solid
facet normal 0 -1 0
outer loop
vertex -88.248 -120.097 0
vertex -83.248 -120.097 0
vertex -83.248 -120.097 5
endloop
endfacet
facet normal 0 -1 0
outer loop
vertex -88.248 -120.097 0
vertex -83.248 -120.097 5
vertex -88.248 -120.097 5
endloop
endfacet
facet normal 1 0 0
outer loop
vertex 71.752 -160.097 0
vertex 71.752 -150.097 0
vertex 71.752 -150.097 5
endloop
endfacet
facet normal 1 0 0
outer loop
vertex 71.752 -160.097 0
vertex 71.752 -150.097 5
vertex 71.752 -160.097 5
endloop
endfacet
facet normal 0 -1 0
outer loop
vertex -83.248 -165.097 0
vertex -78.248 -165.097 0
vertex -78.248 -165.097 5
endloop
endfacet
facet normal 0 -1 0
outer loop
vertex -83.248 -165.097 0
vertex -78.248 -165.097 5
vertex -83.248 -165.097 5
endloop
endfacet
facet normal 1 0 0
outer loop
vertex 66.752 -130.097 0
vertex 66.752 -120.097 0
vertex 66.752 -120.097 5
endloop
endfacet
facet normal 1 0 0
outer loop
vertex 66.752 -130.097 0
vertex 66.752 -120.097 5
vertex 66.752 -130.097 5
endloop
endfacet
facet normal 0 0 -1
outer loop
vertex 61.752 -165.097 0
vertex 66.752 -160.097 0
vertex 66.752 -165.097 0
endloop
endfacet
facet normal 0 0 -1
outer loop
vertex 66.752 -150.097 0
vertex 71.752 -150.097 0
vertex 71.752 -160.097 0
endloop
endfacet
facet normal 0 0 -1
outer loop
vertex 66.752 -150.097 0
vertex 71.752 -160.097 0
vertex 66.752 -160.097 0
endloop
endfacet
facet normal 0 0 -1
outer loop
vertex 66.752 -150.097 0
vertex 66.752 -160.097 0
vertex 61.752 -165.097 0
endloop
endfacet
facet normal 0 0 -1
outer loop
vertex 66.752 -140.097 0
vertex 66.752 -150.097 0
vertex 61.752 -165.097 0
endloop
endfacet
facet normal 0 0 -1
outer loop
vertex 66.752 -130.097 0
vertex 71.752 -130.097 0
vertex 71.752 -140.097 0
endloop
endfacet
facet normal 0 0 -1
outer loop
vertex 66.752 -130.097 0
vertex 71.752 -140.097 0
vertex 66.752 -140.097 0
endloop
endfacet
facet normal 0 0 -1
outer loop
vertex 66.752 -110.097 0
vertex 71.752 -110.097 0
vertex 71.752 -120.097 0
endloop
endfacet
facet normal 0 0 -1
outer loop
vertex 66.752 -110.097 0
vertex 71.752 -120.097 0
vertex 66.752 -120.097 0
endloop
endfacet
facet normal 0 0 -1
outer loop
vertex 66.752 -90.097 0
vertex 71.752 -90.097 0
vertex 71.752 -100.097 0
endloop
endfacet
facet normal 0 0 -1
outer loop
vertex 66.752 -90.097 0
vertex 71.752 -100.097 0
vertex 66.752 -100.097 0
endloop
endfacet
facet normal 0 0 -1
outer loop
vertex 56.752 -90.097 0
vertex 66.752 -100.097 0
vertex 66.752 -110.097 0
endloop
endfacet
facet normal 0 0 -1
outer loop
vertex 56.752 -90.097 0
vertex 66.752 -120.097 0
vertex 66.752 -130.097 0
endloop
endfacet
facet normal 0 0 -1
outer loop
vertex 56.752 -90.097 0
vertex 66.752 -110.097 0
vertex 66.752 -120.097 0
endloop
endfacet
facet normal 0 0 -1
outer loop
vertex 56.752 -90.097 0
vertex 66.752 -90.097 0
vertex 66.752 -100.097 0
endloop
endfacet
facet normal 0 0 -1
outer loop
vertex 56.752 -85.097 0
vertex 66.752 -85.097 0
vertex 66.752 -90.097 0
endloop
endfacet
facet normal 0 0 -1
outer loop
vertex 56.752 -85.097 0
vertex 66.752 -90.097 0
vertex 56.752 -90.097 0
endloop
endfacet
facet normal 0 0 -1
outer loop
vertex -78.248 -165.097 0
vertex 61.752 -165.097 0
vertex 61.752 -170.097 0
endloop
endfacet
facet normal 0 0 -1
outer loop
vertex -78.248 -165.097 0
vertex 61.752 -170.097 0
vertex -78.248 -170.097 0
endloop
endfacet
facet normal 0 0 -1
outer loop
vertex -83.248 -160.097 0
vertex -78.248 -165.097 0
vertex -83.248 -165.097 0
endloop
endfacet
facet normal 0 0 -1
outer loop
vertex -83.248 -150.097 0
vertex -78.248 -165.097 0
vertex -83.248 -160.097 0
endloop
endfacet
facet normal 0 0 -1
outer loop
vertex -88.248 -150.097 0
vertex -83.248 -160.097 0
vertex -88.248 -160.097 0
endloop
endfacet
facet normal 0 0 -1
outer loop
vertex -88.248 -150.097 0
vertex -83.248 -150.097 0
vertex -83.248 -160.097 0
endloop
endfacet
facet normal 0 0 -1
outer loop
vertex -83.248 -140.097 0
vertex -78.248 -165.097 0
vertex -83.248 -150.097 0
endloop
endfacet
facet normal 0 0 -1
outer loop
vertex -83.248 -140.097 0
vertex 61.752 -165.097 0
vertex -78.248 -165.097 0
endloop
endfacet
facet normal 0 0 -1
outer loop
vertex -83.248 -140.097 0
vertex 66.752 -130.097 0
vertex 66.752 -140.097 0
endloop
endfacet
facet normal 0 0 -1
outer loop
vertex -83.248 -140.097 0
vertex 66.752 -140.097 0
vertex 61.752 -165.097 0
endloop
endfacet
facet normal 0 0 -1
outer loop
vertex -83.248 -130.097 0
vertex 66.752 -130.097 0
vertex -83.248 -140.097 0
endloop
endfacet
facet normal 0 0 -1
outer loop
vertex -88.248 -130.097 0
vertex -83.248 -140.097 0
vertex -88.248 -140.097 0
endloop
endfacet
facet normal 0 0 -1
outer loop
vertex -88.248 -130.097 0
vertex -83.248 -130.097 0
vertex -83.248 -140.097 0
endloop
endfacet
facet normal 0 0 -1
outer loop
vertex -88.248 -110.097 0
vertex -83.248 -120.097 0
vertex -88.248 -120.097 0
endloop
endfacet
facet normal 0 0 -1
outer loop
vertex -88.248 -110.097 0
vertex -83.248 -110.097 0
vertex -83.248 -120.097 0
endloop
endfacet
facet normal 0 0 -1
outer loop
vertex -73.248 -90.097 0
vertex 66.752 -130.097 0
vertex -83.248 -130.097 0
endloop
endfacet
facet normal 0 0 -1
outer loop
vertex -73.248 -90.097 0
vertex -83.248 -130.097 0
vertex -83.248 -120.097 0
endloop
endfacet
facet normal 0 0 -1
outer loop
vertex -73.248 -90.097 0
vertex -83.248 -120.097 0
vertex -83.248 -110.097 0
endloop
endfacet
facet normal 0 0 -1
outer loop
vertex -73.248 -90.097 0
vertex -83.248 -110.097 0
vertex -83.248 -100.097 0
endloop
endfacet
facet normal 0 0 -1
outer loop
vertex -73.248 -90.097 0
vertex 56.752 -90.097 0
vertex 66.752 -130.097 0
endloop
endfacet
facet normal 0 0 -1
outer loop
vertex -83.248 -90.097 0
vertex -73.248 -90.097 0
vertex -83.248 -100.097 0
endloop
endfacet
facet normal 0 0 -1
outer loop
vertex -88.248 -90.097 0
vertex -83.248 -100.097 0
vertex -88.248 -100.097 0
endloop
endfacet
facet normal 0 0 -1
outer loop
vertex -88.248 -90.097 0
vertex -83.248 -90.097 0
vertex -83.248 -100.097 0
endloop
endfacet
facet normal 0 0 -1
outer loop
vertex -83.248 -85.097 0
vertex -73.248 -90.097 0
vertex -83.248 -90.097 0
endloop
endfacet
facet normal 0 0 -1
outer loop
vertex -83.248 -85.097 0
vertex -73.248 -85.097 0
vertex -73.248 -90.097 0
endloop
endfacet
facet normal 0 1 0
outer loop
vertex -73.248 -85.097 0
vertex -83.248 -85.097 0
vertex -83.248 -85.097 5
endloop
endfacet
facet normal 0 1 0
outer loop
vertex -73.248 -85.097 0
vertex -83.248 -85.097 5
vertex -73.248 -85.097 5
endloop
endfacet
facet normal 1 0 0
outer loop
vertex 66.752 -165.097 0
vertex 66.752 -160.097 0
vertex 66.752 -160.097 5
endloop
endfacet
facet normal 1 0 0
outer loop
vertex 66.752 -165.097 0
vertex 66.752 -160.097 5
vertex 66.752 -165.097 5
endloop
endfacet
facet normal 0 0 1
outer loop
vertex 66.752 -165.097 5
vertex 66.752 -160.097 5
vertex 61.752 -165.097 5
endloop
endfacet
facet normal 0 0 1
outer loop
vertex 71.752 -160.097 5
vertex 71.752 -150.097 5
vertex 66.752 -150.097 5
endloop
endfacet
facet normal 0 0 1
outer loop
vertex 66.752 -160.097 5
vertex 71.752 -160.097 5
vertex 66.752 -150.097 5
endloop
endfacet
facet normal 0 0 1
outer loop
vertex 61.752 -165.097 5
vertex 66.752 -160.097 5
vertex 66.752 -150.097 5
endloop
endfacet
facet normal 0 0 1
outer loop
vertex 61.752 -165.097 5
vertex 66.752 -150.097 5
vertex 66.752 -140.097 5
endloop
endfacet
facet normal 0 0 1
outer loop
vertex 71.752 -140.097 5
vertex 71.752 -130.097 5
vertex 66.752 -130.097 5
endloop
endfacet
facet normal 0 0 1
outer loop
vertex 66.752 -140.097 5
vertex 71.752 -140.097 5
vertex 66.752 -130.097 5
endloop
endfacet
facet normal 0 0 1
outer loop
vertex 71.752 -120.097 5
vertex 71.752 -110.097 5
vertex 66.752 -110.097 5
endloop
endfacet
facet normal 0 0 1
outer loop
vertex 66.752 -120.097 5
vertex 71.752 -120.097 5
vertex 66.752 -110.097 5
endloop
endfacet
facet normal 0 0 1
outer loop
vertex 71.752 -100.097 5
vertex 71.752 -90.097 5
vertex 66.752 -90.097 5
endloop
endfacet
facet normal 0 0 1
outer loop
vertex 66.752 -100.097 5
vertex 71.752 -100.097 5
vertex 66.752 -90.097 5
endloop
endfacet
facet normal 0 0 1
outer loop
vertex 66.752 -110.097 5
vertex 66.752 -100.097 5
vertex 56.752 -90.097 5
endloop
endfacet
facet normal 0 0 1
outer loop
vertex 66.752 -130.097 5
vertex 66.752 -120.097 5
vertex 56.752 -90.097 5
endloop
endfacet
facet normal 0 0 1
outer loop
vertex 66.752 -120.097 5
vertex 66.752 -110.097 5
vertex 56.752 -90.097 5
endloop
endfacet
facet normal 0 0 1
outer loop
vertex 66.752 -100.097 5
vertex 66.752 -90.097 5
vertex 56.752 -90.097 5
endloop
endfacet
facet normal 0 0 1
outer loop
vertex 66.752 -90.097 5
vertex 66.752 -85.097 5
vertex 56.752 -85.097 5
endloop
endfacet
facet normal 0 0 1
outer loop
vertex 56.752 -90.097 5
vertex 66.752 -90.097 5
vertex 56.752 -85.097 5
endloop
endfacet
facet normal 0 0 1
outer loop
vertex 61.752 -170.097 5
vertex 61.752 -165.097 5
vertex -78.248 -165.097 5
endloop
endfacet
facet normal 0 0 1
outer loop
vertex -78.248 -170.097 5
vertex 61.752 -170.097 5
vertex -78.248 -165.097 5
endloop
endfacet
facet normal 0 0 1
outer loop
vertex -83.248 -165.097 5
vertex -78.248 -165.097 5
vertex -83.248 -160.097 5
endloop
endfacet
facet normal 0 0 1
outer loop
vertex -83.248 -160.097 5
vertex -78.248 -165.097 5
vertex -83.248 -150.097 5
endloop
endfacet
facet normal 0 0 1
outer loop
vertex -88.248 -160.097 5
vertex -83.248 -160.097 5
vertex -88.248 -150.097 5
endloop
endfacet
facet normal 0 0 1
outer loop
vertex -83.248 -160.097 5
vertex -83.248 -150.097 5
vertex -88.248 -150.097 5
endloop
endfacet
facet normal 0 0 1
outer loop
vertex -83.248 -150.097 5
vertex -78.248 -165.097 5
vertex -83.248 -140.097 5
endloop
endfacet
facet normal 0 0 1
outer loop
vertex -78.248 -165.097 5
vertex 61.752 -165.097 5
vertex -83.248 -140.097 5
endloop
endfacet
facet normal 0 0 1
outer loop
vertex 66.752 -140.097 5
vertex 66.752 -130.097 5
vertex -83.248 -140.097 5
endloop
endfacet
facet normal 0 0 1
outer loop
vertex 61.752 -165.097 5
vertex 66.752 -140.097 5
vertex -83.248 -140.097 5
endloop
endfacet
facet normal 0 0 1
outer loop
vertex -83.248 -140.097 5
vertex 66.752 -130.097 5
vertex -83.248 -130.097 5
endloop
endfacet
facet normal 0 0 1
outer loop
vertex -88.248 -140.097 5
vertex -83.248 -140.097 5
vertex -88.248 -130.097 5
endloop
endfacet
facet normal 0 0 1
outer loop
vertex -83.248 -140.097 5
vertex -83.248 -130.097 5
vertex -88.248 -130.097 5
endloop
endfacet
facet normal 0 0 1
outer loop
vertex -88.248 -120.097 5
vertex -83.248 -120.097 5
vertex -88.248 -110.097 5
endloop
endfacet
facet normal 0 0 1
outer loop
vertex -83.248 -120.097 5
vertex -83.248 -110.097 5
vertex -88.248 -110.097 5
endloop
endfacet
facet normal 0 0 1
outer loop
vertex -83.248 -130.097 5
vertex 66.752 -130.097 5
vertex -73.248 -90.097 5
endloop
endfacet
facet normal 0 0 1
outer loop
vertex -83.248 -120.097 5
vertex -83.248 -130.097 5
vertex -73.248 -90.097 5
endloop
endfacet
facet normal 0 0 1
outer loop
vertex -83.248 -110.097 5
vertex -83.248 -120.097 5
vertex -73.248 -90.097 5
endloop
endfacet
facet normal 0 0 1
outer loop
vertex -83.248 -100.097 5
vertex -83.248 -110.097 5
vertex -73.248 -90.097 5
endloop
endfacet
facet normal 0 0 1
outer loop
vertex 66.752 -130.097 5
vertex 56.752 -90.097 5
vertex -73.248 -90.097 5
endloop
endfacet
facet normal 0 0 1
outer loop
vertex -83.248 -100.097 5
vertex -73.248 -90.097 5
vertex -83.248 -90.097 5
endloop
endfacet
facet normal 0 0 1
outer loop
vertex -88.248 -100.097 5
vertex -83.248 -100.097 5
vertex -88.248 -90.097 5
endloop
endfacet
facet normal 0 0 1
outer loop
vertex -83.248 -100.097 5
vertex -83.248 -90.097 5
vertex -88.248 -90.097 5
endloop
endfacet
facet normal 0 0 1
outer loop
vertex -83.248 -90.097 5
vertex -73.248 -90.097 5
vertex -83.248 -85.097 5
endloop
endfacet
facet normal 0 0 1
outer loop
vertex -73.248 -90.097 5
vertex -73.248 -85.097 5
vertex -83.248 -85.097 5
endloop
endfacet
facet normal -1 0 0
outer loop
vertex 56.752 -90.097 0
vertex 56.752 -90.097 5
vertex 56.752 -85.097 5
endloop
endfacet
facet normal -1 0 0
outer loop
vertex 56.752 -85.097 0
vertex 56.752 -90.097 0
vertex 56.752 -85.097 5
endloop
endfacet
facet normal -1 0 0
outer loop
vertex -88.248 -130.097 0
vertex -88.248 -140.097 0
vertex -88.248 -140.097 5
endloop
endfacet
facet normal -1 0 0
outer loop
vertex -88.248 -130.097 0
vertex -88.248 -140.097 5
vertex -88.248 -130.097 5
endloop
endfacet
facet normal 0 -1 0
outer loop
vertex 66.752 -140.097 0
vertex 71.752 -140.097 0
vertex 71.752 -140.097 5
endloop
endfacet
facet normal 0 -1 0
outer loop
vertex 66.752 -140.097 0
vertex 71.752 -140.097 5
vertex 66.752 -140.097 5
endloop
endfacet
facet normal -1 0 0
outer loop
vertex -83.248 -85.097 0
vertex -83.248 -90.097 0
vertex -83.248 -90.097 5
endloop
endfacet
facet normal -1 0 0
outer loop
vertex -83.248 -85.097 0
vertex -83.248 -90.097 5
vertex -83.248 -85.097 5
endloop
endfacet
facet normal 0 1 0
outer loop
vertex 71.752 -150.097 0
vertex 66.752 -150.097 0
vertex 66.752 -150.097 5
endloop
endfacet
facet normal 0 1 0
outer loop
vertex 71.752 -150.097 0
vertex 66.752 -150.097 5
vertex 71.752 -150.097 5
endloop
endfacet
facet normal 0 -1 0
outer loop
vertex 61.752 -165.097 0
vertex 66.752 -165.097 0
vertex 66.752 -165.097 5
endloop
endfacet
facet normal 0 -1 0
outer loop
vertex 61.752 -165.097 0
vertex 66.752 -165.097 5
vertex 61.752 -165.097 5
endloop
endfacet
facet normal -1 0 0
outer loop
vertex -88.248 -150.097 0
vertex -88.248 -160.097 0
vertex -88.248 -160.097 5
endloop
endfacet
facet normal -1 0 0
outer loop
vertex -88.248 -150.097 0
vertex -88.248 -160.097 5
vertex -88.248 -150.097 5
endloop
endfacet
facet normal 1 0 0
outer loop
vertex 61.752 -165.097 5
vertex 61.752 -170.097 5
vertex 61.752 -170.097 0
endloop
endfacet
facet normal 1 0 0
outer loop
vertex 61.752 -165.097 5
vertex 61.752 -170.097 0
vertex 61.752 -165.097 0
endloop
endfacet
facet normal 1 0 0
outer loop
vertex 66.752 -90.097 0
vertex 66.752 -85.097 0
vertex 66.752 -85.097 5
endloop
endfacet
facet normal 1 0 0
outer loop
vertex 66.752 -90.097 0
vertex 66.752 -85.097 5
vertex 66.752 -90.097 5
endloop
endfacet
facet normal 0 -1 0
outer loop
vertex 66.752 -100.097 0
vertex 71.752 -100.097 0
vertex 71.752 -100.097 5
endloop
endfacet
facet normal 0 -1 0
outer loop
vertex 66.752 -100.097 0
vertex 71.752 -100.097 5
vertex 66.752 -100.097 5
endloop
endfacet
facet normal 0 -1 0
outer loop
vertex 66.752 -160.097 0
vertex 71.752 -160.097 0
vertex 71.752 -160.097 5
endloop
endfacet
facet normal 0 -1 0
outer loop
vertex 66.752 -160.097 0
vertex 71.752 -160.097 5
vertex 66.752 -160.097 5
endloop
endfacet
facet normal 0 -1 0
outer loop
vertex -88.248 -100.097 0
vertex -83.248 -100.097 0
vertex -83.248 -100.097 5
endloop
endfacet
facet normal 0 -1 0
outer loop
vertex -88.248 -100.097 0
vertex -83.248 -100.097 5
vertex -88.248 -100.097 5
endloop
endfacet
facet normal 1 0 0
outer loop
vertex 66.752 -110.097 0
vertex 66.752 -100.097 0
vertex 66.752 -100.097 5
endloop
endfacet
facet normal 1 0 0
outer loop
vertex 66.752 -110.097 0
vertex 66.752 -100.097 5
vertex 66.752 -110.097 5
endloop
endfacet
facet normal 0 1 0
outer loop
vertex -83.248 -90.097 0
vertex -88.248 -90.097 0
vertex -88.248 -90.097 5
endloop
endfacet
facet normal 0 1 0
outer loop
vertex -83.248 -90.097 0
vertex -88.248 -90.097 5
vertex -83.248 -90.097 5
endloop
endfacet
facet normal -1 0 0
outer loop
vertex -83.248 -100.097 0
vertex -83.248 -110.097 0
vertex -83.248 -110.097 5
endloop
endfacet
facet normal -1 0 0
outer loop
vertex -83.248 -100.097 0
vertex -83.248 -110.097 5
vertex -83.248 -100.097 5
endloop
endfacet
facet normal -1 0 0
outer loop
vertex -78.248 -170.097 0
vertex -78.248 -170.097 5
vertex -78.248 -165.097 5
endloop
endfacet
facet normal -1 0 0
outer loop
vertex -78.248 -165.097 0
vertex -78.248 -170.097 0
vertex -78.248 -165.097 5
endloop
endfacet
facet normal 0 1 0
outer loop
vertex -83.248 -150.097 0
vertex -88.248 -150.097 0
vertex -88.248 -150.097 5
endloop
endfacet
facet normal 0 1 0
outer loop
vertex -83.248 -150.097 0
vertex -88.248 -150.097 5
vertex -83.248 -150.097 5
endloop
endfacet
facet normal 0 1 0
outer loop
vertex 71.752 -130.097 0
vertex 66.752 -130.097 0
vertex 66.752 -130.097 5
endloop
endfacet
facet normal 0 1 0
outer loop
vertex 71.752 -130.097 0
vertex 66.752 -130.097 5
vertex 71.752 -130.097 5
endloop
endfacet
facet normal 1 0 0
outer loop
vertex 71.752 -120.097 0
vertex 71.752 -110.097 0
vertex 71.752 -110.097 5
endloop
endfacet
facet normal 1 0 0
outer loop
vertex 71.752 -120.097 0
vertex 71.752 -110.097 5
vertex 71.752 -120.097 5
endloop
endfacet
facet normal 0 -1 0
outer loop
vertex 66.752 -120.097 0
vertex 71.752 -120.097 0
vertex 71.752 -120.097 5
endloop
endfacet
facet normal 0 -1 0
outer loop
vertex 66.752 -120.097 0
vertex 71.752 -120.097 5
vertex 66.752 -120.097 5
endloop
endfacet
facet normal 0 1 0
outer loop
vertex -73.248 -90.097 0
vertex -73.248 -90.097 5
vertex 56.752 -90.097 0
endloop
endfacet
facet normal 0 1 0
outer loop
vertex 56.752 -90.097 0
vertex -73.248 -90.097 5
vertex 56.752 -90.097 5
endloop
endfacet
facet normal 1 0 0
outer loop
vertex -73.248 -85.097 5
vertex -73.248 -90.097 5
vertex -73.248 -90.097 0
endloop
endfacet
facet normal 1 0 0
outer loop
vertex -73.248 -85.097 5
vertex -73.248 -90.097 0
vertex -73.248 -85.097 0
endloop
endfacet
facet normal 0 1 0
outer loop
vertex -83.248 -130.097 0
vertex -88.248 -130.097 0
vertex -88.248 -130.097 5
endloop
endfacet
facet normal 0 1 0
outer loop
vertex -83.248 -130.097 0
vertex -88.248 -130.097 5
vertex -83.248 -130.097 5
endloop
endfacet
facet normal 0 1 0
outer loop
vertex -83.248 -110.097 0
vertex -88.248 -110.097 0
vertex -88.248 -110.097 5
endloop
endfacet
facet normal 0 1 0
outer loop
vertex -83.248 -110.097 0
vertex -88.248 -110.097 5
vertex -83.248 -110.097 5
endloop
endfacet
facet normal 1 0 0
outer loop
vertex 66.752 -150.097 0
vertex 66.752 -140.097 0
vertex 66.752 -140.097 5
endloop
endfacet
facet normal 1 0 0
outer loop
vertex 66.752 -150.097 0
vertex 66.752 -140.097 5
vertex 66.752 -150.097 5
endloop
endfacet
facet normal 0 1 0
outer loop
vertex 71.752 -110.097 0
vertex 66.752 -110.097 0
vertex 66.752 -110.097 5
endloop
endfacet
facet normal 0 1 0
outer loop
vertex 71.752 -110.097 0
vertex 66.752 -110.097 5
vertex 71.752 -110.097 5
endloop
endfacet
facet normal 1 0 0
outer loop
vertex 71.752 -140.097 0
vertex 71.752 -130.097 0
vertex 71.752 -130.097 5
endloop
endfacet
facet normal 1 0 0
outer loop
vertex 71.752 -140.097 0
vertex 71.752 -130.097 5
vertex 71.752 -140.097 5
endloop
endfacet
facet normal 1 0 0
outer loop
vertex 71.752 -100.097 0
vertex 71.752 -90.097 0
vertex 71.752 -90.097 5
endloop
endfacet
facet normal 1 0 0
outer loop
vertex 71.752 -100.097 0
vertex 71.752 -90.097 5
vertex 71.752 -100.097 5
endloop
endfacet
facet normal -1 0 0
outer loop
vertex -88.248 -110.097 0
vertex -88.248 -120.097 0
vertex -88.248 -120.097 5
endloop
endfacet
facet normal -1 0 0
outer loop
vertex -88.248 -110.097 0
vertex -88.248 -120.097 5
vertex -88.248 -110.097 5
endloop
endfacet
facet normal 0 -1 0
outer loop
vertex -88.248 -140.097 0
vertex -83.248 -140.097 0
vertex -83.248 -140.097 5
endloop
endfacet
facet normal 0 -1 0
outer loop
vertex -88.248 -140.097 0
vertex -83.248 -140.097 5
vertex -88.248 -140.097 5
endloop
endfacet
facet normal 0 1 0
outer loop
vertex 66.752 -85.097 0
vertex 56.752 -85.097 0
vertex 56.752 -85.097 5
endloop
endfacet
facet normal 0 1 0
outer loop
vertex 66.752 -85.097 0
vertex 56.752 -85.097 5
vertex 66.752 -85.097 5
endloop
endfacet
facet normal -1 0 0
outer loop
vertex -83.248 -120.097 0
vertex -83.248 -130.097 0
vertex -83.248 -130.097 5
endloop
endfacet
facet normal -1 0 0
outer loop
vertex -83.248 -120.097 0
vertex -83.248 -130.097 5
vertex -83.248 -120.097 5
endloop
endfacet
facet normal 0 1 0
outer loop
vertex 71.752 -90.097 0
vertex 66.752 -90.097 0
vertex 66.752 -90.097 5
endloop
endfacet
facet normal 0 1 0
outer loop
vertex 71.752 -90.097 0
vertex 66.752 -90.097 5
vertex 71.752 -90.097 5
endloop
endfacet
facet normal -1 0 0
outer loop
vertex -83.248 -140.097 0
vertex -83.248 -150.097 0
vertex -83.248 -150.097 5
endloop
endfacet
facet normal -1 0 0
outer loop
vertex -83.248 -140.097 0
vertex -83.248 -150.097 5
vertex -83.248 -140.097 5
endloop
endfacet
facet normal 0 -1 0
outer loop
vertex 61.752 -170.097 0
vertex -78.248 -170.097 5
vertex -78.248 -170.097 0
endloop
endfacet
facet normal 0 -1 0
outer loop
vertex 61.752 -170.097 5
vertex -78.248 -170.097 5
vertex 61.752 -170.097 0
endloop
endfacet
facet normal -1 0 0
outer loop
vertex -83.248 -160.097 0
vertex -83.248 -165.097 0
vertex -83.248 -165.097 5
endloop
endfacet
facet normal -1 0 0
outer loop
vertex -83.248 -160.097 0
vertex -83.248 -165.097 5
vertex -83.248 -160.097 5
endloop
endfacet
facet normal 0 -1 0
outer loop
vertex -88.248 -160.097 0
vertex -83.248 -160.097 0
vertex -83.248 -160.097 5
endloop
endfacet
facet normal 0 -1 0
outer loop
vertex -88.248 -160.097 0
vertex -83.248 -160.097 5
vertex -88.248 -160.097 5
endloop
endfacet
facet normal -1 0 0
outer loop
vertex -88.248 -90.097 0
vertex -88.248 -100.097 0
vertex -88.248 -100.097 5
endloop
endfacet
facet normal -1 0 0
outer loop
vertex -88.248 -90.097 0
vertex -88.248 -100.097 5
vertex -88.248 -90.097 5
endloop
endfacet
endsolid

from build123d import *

# Parameters (mm, degrees)
BOSS_EXTRU_1_DEPTH      = 5
ESQUISSE2_W             = 130
ESQUISSE2_H             = 5
ENL_V_MAT_EXTRU_1_DEPTH = 5
ESQUISSE3_W             = 140
ESQUISSE3_H             = 5
BOSS_EXTRU_2_DEPTH      = 5


with BuildPart() as part:
    # Esquisse1 → Boss.-Extru.1 (new body)
    with BuildSketch(Plane.XY):
        Polygon((-83.248069132, -165.097223543), (-83.248069132, -160.097223543), (-88.248069132, -160.097223543), (-88.248069132, -150.097223543), (-83.248069132, -150.097223543), (-83.248069132, -140.097223543), (-88.248069132, -140.097223543), (-88.248069132, -130.097223543), (-83.248069132, -130.097223543), (-83.248069132, -120.097223543), (-88.248069132, -120.097223543), (-88.248069132, -110.097223543), (-83.248069132, -110.097223543), (-83.248069132, -100.097223543), (-88.248069132, -100.097223543), (-88.248069132, -90.097223543), (-83.248069132, -90.097223543), (-83.248069132, -85.097223543), (66.751930868, -85.097223543), (66.751930868, -90.097223543), (71.751930868, -90.097223543), (71.751930868, -100.097223543), (66.751930868, -100.097223543), (66.751930868, -110.097223543), (71.751930868, -110.097223543), (71.751930868, -120.097223543), (66.751930868, -120.097223543), (66.751930868, -130.097223543), (71.751930868, -130.097223543), (71.751930868, -140.097223543), (66.751930868, -140.097223543), (66.751930868, -150.097223543), (71.751930868, -150.097223543), (71.751930868, -160.097223543), (66.751930868, -160.097223543), (66.751930868, -165.097223543), align=None)
    extrude(amount=BOSS_EXTRU_1_DEPTH)

    # Esquisse2 → Enlèv. mat.-Extru.1 (cut)
    with BuildSketch(Plane.XY.offset(5)):
        with Locations((-8.248069132, -87.597223543)):
            Rectangle(ESQUISSE2_W, ESQUISSE2_H)
    extrude(amount=-ENL_V_MAT_EXTRU_1_DEPTH, mode=Mode.SUBTRACT)

    # Esquisse3 → Boss.-Extru.2 (add)
    with BuildSketch(Plane.XY.offset(5)):
        with Locations((-8.248069132, -167.597223543)):
            Rectangle(ESQUISSE3_W, ESQUISSE3_H)
    extrude(amount=-BOSS_EXTRU_2_DEPTH)


solid = part.part
